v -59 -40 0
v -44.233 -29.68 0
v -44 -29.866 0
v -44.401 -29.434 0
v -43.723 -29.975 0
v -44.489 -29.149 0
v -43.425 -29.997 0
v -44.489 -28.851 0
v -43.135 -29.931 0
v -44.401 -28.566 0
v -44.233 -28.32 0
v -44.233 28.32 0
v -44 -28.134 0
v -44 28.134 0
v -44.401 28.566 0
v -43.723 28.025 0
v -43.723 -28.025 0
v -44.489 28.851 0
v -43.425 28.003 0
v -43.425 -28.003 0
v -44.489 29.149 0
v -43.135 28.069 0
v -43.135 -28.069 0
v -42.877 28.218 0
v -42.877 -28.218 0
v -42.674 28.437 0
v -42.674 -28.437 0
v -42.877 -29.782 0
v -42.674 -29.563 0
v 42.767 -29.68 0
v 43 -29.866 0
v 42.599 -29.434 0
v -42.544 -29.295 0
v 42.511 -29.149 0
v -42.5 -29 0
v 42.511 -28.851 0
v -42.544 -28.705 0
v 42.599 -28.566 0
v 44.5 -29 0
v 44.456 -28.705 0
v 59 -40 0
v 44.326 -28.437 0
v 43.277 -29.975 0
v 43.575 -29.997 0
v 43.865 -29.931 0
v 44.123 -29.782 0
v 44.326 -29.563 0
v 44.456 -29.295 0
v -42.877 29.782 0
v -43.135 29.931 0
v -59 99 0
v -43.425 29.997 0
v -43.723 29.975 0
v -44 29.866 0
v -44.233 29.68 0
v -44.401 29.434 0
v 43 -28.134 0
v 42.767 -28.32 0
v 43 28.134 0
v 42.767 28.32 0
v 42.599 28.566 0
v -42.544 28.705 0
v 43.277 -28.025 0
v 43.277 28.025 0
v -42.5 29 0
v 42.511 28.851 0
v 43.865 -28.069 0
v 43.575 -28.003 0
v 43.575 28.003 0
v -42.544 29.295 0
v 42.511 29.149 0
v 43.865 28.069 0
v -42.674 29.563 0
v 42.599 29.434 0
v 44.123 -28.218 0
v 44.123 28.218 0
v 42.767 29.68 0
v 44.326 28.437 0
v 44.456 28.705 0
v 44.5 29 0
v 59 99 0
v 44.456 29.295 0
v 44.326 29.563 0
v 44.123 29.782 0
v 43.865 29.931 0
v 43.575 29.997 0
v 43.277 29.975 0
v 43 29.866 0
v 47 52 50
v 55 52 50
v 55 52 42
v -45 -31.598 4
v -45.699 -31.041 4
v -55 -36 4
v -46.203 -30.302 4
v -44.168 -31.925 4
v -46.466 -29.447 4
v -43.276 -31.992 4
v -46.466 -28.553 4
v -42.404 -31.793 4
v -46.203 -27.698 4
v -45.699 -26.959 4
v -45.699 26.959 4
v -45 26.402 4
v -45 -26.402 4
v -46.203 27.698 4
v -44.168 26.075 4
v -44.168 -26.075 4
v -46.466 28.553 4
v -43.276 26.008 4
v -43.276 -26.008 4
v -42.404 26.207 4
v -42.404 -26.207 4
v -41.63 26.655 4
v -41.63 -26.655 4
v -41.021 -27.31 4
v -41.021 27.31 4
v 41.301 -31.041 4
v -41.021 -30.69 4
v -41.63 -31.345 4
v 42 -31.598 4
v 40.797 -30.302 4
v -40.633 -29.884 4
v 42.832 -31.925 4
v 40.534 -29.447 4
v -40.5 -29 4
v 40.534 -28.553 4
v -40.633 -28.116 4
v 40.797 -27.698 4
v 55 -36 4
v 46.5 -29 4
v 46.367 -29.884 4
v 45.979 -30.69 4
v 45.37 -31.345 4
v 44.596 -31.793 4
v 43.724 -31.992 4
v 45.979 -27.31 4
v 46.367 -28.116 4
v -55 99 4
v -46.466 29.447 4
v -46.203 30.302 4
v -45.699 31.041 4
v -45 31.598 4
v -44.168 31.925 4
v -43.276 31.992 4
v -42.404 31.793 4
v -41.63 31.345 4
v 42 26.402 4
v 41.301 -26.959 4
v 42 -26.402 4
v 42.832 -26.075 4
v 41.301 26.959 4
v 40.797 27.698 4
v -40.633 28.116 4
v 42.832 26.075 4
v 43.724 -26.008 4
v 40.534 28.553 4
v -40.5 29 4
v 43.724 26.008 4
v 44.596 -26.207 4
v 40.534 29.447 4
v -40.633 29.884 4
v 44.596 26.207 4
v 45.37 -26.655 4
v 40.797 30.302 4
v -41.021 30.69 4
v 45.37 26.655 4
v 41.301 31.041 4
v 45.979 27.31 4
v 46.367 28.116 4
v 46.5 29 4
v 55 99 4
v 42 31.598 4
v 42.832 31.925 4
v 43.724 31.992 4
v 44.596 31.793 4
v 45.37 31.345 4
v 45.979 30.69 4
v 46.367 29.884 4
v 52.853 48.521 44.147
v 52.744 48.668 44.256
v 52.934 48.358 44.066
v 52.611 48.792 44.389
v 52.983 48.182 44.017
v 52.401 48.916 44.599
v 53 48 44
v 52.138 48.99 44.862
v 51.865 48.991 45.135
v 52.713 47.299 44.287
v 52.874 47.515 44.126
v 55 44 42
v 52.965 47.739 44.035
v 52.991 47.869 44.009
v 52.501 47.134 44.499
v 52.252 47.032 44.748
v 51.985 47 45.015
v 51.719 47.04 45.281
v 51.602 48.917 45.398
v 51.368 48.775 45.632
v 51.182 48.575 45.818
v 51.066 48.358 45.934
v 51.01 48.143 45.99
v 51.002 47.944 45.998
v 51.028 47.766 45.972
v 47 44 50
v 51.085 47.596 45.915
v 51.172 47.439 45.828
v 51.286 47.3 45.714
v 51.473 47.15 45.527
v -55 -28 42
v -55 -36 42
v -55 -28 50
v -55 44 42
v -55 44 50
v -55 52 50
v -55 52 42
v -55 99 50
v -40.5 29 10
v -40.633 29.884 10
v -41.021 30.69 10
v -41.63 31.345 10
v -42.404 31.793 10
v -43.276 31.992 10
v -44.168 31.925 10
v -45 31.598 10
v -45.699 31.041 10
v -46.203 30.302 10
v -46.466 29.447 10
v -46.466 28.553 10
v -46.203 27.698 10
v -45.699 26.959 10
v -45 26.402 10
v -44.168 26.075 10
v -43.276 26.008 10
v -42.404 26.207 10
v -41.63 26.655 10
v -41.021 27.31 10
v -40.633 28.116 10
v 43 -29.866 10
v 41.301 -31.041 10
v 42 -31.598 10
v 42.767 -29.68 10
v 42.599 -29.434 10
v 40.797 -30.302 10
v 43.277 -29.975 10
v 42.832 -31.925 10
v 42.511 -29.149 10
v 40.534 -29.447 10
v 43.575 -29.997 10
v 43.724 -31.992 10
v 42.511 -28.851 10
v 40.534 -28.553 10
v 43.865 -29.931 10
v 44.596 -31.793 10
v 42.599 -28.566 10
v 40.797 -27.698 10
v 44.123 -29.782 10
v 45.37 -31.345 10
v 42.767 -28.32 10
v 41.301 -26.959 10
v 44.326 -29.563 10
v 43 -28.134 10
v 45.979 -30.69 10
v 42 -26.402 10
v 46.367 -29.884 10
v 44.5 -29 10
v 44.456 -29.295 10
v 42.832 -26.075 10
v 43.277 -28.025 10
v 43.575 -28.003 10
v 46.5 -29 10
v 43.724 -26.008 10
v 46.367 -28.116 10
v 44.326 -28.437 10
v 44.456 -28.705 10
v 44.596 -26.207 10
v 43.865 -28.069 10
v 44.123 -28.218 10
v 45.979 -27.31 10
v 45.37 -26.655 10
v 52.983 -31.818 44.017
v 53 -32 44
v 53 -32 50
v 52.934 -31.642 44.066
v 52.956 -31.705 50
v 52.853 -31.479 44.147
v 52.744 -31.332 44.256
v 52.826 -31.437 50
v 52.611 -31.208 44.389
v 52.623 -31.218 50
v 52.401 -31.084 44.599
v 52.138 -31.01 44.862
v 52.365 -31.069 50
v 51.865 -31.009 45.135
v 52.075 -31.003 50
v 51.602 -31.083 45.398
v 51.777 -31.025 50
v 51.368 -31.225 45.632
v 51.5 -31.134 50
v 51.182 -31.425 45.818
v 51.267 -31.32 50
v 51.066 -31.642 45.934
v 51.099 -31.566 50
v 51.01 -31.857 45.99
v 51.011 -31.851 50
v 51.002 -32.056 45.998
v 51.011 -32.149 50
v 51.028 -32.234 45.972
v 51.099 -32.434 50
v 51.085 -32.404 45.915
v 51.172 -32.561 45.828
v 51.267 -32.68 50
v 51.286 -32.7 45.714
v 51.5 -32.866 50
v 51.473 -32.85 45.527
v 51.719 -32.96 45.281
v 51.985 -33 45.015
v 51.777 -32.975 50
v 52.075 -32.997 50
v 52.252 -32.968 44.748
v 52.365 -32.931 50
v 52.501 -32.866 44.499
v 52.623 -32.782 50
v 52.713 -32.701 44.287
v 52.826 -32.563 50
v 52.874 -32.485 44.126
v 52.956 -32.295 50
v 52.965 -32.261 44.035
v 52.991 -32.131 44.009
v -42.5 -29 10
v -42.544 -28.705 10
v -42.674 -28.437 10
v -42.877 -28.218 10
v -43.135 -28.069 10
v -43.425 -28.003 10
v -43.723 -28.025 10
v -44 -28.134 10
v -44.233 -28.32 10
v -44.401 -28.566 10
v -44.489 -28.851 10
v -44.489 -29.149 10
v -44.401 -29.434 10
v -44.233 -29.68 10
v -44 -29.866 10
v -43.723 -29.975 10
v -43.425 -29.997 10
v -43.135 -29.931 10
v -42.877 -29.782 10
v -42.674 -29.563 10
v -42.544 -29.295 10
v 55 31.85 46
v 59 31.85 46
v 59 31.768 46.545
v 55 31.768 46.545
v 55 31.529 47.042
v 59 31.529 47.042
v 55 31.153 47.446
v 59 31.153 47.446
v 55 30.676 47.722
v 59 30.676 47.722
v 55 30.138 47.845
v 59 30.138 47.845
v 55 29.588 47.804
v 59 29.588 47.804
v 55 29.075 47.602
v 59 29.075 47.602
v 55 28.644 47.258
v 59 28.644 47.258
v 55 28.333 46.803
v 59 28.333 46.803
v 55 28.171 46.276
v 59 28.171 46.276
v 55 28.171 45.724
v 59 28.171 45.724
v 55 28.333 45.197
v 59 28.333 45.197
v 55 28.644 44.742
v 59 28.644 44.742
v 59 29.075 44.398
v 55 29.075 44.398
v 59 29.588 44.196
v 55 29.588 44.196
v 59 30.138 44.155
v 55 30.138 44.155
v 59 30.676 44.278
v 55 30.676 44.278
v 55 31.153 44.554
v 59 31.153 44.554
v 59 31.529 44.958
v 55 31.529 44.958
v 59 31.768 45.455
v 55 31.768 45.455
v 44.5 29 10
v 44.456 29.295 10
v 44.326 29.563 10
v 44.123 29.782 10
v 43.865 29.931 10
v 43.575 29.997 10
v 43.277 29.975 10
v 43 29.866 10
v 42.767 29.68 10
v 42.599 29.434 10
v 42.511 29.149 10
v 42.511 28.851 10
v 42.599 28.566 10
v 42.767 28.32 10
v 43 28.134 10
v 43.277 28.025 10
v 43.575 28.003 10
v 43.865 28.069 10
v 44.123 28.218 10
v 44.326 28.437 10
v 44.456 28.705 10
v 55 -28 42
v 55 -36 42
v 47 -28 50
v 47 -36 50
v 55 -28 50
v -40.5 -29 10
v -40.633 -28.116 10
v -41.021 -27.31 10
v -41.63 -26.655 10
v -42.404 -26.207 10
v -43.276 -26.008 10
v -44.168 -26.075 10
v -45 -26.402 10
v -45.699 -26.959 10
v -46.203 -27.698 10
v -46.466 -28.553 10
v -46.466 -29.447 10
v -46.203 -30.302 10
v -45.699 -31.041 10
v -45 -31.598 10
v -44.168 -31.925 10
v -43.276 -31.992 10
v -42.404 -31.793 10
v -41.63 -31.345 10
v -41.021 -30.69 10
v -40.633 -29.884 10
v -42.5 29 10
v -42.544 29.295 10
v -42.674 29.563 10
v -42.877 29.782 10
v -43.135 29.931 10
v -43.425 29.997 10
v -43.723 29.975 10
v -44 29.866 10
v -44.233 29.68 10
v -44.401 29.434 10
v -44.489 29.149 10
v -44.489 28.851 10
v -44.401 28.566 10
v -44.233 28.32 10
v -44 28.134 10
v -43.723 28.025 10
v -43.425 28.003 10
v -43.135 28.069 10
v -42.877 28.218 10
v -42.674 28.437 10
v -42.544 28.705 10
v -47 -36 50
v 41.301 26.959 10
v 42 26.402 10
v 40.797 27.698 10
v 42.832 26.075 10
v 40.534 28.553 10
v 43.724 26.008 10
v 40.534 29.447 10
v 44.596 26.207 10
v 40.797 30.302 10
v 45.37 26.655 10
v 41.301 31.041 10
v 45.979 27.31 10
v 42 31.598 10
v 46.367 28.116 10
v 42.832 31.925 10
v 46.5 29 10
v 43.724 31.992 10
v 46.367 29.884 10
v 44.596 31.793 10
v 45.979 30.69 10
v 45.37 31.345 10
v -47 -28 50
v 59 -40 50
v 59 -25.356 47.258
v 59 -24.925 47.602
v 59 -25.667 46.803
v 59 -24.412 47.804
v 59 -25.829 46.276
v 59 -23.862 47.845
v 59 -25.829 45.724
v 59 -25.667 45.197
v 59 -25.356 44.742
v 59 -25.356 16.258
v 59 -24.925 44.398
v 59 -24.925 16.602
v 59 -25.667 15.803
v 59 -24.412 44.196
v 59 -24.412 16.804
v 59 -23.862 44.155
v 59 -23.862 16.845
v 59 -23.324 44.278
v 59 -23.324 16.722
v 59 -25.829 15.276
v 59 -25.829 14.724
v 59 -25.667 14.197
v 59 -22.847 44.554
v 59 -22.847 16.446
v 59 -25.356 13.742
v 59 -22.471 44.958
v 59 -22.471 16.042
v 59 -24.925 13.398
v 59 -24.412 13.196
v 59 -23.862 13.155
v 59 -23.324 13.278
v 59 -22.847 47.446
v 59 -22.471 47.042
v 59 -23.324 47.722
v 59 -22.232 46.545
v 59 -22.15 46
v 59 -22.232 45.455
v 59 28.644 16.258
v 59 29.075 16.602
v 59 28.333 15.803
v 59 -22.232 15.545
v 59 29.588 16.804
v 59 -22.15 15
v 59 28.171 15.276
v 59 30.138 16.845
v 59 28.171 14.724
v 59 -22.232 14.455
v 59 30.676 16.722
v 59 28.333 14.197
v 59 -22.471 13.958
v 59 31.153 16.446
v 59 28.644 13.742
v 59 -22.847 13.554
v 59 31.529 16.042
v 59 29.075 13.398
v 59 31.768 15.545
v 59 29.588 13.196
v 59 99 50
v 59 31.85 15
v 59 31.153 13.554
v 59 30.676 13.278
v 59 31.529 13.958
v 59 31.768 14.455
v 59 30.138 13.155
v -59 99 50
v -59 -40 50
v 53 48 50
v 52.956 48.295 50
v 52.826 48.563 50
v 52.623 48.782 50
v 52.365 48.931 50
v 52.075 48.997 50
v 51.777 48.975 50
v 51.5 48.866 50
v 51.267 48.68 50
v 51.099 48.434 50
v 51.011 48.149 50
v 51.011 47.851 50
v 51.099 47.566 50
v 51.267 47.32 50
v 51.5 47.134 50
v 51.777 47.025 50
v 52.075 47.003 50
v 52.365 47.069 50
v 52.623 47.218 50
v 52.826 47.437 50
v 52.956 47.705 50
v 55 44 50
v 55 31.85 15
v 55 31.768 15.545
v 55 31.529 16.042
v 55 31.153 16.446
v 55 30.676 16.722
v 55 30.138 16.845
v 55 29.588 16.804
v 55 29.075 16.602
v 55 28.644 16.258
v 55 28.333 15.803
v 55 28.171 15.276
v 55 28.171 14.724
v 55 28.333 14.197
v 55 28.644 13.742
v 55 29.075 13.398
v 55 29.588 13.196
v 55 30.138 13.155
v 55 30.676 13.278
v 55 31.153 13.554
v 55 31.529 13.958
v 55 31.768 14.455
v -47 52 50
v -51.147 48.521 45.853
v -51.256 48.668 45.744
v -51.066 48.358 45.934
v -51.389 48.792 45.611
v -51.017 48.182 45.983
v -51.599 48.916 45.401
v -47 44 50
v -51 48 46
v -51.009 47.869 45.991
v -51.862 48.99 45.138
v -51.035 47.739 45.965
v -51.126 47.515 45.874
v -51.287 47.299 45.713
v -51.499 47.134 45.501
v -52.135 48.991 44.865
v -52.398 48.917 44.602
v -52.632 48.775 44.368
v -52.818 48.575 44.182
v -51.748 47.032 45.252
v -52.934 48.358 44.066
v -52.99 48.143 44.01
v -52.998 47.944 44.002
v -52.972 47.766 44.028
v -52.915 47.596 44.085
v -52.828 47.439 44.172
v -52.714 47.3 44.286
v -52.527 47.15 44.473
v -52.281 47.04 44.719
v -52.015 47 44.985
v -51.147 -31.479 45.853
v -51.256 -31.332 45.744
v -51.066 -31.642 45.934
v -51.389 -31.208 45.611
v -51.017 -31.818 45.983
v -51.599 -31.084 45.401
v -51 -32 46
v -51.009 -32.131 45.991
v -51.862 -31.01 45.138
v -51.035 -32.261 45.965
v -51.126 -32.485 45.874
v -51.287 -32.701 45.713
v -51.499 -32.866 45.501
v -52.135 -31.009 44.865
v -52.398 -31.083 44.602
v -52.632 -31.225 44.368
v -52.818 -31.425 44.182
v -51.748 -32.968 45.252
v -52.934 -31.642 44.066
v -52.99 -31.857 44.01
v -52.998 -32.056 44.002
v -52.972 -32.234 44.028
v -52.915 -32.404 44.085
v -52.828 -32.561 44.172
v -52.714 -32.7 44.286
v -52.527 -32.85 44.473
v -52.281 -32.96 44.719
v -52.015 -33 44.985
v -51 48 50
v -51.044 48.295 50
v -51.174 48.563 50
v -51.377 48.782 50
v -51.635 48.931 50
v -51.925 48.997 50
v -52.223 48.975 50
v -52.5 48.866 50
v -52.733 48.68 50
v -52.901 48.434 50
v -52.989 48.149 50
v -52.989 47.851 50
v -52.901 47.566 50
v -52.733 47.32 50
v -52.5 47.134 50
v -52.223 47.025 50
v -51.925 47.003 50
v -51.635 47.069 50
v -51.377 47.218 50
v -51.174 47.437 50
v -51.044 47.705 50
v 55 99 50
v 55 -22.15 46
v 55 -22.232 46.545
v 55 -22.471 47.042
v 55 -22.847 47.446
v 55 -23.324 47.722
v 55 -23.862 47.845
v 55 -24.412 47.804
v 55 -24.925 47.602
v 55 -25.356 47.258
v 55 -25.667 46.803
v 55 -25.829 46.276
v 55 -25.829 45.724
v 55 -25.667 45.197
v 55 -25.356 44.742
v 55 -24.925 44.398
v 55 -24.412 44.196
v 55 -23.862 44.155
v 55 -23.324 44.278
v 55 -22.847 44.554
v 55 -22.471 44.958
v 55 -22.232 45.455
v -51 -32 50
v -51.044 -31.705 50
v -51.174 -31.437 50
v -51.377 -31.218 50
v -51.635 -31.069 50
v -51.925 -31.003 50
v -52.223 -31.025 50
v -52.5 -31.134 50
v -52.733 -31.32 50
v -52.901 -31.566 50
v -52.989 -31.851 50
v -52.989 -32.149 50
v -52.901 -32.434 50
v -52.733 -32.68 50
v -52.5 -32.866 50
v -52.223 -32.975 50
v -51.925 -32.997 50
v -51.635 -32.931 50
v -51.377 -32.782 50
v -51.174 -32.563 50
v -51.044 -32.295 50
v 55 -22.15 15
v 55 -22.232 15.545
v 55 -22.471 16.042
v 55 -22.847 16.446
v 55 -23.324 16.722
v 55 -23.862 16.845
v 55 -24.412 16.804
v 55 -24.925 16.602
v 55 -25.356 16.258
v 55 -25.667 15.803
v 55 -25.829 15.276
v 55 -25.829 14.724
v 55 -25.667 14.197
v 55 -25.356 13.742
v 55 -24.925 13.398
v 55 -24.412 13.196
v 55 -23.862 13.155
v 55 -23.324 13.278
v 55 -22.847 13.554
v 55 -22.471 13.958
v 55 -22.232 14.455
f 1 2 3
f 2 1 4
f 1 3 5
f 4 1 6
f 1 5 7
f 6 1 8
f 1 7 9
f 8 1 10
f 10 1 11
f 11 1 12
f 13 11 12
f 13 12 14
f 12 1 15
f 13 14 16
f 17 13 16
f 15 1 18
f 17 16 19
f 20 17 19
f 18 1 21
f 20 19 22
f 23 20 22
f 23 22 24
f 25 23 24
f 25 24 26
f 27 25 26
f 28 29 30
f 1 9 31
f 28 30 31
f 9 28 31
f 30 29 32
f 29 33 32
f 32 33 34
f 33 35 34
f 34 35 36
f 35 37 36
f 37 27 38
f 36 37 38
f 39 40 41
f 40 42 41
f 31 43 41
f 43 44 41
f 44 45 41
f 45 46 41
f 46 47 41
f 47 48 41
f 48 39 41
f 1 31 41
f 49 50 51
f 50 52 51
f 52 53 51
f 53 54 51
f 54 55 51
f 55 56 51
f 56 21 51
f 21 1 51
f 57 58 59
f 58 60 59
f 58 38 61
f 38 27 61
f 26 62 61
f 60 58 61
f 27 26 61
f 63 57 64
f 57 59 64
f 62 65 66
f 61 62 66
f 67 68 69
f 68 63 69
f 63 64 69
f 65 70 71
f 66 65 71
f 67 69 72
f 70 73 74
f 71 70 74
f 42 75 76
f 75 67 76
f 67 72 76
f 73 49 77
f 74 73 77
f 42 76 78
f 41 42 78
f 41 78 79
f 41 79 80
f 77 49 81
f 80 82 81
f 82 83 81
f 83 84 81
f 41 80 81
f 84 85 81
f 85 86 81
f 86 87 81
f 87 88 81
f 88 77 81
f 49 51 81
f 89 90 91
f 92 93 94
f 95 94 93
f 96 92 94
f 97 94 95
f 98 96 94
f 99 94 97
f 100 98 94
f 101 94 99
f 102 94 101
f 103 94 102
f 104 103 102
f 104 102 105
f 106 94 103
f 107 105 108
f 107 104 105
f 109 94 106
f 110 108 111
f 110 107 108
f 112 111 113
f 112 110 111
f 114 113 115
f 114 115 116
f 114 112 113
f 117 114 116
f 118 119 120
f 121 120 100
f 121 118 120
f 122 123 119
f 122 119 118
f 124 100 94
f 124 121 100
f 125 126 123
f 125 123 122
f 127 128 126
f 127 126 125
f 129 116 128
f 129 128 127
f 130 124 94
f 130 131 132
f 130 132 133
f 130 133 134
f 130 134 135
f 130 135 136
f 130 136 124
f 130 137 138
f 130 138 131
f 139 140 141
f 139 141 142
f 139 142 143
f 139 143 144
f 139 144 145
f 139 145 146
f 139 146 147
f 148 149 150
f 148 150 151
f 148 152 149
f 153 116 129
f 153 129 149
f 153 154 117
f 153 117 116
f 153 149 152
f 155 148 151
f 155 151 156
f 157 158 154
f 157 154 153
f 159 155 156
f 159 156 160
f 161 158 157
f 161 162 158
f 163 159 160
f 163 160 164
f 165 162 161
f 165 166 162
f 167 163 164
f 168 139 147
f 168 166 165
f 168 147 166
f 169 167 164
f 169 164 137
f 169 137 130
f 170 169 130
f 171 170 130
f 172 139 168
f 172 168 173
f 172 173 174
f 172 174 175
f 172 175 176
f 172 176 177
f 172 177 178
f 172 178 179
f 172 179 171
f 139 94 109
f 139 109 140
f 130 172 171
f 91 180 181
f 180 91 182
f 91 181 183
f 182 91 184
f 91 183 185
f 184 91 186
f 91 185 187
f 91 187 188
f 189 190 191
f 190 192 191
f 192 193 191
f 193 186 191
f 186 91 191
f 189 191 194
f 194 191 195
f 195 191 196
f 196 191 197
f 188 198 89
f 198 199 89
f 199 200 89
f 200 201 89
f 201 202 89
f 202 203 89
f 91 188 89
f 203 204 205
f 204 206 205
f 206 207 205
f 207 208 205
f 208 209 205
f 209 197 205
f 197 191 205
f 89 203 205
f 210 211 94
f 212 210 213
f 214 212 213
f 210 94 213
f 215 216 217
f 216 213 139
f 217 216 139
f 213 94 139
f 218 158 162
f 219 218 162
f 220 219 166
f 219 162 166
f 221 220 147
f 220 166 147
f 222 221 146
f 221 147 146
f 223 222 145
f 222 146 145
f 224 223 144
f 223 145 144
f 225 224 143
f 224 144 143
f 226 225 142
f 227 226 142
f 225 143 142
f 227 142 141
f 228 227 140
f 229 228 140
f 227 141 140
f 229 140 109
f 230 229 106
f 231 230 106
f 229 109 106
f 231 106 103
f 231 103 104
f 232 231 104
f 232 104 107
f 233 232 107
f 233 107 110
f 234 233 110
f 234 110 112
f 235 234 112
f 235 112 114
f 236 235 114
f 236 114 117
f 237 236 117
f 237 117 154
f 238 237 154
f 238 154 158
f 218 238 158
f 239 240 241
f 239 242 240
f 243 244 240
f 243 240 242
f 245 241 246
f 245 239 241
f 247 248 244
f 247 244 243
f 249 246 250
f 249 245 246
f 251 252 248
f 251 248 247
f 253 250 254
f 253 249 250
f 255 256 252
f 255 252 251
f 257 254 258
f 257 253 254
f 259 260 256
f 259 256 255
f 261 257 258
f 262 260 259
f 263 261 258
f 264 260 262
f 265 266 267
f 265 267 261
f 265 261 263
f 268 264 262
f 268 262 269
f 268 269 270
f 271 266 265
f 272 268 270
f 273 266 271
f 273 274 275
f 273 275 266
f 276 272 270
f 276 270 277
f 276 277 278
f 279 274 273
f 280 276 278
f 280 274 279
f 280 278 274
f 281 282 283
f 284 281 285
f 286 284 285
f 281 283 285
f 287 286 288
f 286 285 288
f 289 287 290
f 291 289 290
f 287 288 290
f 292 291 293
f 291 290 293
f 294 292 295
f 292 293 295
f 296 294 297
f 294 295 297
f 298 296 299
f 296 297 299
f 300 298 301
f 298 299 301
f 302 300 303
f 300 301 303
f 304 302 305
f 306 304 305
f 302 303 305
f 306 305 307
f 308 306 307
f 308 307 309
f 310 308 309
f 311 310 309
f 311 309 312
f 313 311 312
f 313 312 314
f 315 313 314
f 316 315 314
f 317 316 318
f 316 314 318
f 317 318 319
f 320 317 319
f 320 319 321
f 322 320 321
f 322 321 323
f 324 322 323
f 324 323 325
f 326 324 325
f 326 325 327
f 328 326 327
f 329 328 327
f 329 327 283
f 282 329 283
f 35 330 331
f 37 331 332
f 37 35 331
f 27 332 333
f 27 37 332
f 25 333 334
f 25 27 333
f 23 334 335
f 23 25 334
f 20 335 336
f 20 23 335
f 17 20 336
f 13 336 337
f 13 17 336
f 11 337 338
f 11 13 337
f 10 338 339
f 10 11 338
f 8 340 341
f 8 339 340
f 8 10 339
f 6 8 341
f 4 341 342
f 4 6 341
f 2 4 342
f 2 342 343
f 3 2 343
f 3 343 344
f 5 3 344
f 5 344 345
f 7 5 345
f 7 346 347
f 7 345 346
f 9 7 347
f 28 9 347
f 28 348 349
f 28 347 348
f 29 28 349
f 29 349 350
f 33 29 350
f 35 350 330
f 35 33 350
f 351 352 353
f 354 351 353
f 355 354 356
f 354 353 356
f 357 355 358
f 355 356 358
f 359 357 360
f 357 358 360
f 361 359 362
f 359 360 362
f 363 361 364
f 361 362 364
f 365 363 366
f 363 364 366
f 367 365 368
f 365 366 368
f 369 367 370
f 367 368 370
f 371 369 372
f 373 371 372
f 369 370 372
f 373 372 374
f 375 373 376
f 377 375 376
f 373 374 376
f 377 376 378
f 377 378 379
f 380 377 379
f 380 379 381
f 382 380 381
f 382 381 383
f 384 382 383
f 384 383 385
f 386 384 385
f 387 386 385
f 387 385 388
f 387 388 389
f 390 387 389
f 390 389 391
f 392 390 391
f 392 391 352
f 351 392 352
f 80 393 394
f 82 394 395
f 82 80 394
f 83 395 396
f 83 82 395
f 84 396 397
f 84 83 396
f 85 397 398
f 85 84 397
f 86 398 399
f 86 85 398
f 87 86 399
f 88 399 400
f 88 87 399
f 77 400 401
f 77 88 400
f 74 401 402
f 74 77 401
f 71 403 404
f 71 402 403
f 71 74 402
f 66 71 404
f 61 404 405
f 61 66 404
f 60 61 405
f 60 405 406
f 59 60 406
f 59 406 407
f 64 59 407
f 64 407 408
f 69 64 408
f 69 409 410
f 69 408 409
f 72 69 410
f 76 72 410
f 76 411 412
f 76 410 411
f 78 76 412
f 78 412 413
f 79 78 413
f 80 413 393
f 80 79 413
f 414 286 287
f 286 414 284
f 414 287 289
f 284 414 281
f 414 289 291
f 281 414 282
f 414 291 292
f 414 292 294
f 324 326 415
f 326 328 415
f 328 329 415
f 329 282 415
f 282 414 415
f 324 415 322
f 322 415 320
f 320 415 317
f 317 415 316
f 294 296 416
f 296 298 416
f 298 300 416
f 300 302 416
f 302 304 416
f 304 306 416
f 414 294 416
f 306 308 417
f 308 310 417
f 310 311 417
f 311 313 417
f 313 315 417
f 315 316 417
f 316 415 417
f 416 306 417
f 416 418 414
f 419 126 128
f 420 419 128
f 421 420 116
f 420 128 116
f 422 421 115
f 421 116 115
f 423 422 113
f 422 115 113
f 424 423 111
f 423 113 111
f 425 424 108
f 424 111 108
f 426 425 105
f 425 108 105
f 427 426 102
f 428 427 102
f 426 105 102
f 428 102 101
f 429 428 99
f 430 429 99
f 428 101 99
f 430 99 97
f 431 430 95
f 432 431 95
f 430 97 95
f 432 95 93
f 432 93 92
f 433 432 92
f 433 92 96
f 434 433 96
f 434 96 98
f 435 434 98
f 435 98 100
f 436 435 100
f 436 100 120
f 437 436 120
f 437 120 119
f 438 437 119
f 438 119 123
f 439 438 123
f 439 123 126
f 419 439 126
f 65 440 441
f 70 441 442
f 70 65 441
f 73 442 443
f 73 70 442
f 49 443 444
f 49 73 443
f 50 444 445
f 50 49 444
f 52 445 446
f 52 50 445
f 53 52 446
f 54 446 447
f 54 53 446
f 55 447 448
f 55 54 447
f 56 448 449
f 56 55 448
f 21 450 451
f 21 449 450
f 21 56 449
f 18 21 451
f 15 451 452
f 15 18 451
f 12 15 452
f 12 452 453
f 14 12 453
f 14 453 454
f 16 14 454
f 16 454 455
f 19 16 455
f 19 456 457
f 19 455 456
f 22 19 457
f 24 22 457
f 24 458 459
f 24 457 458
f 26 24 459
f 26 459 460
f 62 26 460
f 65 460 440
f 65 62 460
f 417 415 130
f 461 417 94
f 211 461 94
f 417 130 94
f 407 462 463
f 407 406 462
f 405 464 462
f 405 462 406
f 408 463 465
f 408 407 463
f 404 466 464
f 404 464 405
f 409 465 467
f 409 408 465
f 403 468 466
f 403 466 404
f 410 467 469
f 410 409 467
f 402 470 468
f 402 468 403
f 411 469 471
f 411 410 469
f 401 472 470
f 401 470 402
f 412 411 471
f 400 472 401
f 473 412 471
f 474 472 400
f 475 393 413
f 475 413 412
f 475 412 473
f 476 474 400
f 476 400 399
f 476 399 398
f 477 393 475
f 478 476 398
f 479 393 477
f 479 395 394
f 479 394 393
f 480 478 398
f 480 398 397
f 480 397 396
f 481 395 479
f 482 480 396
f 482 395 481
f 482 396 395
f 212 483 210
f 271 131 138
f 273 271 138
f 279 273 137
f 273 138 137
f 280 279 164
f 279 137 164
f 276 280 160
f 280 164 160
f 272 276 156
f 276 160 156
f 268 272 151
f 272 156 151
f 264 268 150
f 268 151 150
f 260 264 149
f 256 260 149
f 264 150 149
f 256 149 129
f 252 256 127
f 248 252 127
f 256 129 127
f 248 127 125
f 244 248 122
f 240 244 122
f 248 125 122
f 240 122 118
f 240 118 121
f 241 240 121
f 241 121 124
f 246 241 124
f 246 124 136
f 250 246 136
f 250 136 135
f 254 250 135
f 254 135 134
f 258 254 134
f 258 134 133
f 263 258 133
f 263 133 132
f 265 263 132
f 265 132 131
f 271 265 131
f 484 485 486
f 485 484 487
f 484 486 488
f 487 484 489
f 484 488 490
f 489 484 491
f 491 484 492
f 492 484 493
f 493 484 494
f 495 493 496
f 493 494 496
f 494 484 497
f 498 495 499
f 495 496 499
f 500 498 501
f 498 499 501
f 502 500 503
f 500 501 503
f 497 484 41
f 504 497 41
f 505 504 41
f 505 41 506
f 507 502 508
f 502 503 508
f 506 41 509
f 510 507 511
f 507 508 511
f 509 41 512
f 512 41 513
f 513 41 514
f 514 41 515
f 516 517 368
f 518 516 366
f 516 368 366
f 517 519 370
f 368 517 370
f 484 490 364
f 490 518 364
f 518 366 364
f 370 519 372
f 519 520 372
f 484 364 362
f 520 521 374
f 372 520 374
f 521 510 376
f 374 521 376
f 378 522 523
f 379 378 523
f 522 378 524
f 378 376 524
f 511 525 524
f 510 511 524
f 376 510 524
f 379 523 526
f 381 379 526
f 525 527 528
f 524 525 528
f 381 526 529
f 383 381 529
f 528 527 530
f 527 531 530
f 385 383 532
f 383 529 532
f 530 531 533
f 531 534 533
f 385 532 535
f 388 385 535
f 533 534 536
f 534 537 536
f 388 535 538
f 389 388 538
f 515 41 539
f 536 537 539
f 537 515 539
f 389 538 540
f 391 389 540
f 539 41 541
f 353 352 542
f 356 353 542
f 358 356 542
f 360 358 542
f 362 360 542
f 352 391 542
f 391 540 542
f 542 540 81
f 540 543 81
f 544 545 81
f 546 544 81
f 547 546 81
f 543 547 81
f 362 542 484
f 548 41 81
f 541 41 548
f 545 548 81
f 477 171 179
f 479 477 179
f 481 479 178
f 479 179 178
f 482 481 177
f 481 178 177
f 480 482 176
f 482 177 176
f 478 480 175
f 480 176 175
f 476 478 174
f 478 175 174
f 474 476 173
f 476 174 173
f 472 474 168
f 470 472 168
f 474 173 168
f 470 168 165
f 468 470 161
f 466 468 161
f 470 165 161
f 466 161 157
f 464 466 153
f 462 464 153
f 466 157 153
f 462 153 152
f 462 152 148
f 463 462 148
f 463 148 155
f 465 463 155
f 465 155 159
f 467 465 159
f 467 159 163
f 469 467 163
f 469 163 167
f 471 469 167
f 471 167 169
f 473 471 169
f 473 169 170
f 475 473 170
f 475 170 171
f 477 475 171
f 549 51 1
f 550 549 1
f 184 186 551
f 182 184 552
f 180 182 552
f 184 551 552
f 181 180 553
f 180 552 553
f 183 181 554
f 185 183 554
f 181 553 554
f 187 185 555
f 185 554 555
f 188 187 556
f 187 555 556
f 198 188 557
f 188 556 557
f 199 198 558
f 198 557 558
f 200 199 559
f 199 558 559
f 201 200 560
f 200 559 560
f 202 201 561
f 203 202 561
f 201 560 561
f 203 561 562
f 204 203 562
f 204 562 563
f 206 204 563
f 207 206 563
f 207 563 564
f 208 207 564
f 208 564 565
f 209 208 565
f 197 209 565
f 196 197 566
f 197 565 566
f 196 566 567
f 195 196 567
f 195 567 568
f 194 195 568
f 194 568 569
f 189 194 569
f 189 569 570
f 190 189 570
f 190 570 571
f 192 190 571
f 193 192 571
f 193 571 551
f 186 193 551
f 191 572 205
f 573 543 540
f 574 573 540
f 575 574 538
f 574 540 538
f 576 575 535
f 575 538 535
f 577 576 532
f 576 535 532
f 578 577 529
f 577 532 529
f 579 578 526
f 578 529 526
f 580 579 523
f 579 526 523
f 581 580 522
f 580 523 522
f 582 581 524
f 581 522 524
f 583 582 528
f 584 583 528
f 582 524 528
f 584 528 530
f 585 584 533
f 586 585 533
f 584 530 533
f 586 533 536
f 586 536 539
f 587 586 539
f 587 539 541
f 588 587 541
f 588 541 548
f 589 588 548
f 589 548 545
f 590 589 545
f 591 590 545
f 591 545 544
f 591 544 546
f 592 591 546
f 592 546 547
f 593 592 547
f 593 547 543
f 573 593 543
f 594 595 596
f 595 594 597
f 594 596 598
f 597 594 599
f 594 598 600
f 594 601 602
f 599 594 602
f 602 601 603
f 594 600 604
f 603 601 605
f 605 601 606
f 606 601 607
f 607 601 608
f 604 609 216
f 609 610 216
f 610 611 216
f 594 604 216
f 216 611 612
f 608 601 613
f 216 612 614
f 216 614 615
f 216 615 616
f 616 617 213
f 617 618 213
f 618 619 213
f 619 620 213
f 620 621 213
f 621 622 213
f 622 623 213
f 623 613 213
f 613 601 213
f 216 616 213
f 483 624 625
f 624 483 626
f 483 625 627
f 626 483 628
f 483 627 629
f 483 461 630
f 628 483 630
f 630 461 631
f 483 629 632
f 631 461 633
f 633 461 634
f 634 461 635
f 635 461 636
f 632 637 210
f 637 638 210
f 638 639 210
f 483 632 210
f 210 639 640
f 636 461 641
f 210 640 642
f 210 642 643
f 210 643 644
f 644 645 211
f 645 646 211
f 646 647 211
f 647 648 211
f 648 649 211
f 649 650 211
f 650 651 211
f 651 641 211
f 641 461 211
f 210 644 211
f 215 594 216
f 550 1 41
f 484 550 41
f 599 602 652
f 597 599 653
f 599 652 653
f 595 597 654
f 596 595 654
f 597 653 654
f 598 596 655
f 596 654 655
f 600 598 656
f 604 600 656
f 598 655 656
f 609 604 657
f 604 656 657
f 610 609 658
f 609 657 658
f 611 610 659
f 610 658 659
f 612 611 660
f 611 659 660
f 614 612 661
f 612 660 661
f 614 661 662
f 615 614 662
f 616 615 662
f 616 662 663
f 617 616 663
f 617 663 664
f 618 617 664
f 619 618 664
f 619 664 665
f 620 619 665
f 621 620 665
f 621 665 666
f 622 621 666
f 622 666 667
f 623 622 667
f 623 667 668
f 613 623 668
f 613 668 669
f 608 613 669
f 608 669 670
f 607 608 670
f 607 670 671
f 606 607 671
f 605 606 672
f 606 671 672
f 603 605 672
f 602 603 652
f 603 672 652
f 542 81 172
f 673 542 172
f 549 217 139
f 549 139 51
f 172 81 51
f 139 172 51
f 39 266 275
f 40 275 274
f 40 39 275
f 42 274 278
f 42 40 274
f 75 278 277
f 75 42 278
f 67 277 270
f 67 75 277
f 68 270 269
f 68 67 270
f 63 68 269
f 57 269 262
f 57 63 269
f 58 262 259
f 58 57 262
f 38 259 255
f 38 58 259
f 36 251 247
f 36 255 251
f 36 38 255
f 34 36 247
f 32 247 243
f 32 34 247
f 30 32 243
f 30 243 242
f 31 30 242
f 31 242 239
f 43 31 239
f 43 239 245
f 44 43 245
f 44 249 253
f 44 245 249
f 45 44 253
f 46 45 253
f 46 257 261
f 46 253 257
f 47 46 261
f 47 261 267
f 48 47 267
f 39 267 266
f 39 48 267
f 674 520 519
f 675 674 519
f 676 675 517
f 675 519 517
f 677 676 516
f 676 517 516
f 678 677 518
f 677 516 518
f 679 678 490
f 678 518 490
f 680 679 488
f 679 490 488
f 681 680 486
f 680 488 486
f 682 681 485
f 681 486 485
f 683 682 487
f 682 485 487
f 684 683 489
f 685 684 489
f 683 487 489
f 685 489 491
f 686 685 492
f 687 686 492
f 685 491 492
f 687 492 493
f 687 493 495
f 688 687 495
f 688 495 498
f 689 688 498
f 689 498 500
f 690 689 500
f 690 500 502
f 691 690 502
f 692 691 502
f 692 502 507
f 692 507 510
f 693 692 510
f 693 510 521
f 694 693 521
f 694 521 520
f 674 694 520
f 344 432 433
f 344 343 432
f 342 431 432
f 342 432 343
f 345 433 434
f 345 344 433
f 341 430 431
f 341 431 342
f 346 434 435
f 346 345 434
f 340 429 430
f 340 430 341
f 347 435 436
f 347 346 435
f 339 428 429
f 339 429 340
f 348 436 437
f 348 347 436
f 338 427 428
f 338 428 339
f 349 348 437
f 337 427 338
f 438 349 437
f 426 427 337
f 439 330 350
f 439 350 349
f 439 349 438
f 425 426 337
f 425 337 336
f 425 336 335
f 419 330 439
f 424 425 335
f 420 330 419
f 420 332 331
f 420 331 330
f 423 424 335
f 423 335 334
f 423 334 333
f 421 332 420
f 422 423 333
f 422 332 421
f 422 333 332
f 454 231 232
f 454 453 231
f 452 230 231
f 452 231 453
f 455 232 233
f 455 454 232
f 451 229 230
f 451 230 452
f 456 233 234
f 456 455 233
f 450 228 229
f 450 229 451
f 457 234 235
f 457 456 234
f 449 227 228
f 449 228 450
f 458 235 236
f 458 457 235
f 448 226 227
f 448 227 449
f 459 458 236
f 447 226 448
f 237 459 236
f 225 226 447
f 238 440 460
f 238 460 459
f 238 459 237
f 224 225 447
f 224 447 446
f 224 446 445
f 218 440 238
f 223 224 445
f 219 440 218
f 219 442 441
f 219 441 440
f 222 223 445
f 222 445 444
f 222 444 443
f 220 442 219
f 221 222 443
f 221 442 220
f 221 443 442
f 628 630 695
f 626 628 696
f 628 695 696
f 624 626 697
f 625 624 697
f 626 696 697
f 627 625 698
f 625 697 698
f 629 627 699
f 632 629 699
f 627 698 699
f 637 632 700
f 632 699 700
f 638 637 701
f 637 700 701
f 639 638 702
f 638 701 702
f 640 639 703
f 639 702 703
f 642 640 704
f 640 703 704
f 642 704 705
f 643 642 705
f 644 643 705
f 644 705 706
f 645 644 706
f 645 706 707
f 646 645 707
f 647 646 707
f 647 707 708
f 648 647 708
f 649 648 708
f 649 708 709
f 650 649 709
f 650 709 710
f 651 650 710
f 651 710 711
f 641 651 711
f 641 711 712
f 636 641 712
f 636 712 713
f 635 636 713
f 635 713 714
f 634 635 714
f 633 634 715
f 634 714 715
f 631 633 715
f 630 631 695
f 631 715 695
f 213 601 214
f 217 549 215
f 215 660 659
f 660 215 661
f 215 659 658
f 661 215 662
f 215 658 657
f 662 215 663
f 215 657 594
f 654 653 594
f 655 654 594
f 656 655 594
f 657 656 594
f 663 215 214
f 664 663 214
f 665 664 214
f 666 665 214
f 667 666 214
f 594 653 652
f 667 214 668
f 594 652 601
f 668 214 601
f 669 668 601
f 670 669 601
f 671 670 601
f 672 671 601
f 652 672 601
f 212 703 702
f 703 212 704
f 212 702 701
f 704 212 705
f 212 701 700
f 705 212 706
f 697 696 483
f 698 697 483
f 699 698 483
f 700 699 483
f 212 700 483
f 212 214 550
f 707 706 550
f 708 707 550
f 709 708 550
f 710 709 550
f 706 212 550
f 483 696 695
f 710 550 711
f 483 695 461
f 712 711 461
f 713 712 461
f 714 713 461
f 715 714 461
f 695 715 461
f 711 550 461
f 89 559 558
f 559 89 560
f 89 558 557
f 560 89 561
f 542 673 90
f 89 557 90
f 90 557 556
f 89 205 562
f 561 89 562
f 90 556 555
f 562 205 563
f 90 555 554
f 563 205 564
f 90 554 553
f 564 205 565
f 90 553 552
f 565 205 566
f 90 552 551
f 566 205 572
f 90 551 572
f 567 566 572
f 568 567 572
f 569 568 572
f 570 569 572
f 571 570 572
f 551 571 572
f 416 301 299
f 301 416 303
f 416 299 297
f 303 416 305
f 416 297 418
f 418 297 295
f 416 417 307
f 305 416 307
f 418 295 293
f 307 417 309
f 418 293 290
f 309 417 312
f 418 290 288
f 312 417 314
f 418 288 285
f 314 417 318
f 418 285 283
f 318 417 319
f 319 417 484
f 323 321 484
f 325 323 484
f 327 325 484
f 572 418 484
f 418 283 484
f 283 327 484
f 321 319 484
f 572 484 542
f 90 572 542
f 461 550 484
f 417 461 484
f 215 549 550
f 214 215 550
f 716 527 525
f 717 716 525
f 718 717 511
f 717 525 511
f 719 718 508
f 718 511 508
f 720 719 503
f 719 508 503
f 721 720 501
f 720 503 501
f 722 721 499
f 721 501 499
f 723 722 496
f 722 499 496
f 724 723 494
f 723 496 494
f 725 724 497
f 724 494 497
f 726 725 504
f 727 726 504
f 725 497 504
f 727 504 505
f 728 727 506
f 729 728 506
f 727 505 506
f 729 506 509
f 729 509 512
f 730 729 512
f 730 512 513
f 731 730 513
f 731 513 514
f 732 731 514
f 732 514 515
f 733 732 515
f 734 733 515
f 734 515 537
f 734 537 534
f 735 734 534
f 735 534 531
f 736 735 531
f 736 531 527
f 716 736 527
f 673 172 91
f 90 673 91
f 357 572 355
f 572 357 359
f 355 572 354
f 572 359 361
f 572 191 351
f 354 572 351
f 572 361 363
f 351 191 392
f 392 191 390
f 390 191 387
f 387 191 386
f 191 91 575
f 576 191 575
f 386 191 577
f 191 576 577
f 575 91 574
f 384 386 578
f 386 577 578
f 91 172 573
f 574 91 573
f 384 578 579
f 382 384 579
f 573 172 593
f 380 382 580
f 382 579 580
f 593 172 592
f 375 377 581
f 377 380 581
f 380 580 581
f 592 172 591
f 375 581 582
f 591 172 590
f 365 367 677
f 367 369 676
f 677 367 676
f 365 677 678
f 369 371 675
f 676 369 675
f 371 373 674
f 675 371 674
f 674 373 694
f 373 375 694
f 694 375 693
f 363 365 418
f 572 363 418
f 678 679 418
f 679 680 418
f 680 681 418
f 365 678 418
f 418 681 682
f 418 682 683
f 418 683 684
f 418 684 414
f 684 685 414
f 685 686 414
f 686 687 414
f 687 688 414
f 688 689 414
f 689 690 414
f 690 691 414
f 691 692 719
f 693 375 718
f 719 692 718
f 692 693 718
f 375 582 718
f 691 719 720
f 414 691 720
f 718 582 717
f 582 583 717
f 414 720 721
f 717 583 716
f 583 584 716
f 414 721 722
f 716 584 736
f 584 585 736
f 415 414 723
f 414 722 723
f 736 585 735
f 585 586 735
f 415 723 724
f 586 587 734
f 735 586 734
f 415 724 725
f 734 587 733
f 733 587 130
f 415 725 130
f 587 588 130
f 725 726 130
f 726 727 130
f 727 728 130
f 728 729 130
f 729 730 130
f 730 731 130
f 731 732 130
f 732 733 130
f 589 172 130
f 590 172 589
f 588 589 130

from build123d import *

# Parameters (mm, degrees)
SKETCH002_W         = 117
SKETCH002_H         = 138
PAD001_DEPTH        = 4
SKETCH003_R         = 3
PAD002_DEPTH        = 10
SKETCH004_R         = 1
POCKET_DEPTH        = 0.001
POCKET_DEPTH_BACK   = 10.001
PAD003_DEPTH        = 50
PAD004_DEPTH        = 8
LINEARPATTERN_COUNT = 2
LINEARPATTERN_PITCH = 80
SKETCH007_R         = 1
POCKET001_DEPTH     = 10
SKETCH008_R         = 1.85
POCKET002_DEPTH     = 7


with BuildPart() as part:
    # Sketch002 → Pad001 (new body)
    with BuildSketch(Plane.XY):
        with Locations((0, 30)):
            Rectangle(SKETCH002_W, SKETCH002_H)
    extrude(amount=PAD001_DEPTH)

    # Sketch003 → Pad002 (join)
    with BuildSketch(Plane.XY):
        with Locations((43.5, -29)):
            Circle(SKETCH003_R)
        with Locations((43.5, 29)):
            Circle(SKETCH003_R)
        with Locations((-43.5, 29)):
            Circle(SKETCH003_R)
        with Locations((-43.5, -29)):
            Circle(SKETCH003_R)
    extrude(amount=PAD002_DEPTH)

    # Sketch004 → Pocket (cut, two sides)
    with BuildSketch(Plane.XY) as pocket_sk:
        with Locations((43.5, -29)):
            Circle(SKETCH004_R)
        with Locations((43.5, 29)):
            Circle(SKETCH004_R)
        with Locations((-43.5, 29)):
            Circle(SKETCH004_R)
        with Locations((-43.5, -29)):
            Circle(SKETCH004_R)
    extrude(amount=-POCKET_DEPTH, mode=Mode.SUBTRACT)
    extrude(pocket_sk.sketch, amount=POCKET_DEPTH_BACK, mode=Mode.SUBTRACT)

    # Sketch005 → Pad003 (join)
    with BuildSketch(Plane.XY):
        Polygon((-59, -40), (59, -40), (59, 99), (55, 99), (55, -36), (-55, -36), (-55, 99), (-59, 99), align=None)
    extrude(amount=PAD003_DEPTH)

    # Sketch006 → Pad004 (join)
    with BuildSketch(Plane(origin=(0, -36, 0), x_dir=(-1, 0, 0), z_dir=(0, 1, 0))):
        Polygon((-55, 50), (-55, 42), (-47, 50), align=None)
        Polygon((47, 50), (55, 42), (55, 50), align=None)
    pad004 = extrude(amount=PAD004_DEPTH)

    # LinearPattern: Pad004 ×2
    with Locations(*[(0, i * LINEARPATTERN_PITCH, 0) for i in range(1, LINEARPATTERN_COUNT)]):
        add(pad004)

    # Sketch007 → Pocket001 (cut)
    with BuildSketch(Plane.XY.offset(50)):
        with Locations((52, -32)):
            Circle(SKETCH007_R)
        with Locations((-52, -32)):
            Circle(SKETCH007_R)
        with Locations((-52, 48)):
            Circle(SKETCH007_R)
        with Locations((52, 48)):
            Circle(SKETCH007_R)
    extrude(amount=-POCKET001_DEPTH, mode=Mode.SUBTRACT)

    # Sketch008 → Pocket002 (cut)
    with BuildSketch(Plane.YZ.offset(59)):
        with Locations((-24, 15)):
            Circle(SKETCH008_R)
        with Locations((30, 15)):
            Circle(SKETCH008_R)
        with Locations((30, 46)):
            Circle(SKETCH008_R)
        with Locations((-24, 46)):
            Circle(SKETCH008_R)
    extrude(amount=-POCKET002_DEPTH, mode=Mode.SUBTRACT)


solid = part.part
